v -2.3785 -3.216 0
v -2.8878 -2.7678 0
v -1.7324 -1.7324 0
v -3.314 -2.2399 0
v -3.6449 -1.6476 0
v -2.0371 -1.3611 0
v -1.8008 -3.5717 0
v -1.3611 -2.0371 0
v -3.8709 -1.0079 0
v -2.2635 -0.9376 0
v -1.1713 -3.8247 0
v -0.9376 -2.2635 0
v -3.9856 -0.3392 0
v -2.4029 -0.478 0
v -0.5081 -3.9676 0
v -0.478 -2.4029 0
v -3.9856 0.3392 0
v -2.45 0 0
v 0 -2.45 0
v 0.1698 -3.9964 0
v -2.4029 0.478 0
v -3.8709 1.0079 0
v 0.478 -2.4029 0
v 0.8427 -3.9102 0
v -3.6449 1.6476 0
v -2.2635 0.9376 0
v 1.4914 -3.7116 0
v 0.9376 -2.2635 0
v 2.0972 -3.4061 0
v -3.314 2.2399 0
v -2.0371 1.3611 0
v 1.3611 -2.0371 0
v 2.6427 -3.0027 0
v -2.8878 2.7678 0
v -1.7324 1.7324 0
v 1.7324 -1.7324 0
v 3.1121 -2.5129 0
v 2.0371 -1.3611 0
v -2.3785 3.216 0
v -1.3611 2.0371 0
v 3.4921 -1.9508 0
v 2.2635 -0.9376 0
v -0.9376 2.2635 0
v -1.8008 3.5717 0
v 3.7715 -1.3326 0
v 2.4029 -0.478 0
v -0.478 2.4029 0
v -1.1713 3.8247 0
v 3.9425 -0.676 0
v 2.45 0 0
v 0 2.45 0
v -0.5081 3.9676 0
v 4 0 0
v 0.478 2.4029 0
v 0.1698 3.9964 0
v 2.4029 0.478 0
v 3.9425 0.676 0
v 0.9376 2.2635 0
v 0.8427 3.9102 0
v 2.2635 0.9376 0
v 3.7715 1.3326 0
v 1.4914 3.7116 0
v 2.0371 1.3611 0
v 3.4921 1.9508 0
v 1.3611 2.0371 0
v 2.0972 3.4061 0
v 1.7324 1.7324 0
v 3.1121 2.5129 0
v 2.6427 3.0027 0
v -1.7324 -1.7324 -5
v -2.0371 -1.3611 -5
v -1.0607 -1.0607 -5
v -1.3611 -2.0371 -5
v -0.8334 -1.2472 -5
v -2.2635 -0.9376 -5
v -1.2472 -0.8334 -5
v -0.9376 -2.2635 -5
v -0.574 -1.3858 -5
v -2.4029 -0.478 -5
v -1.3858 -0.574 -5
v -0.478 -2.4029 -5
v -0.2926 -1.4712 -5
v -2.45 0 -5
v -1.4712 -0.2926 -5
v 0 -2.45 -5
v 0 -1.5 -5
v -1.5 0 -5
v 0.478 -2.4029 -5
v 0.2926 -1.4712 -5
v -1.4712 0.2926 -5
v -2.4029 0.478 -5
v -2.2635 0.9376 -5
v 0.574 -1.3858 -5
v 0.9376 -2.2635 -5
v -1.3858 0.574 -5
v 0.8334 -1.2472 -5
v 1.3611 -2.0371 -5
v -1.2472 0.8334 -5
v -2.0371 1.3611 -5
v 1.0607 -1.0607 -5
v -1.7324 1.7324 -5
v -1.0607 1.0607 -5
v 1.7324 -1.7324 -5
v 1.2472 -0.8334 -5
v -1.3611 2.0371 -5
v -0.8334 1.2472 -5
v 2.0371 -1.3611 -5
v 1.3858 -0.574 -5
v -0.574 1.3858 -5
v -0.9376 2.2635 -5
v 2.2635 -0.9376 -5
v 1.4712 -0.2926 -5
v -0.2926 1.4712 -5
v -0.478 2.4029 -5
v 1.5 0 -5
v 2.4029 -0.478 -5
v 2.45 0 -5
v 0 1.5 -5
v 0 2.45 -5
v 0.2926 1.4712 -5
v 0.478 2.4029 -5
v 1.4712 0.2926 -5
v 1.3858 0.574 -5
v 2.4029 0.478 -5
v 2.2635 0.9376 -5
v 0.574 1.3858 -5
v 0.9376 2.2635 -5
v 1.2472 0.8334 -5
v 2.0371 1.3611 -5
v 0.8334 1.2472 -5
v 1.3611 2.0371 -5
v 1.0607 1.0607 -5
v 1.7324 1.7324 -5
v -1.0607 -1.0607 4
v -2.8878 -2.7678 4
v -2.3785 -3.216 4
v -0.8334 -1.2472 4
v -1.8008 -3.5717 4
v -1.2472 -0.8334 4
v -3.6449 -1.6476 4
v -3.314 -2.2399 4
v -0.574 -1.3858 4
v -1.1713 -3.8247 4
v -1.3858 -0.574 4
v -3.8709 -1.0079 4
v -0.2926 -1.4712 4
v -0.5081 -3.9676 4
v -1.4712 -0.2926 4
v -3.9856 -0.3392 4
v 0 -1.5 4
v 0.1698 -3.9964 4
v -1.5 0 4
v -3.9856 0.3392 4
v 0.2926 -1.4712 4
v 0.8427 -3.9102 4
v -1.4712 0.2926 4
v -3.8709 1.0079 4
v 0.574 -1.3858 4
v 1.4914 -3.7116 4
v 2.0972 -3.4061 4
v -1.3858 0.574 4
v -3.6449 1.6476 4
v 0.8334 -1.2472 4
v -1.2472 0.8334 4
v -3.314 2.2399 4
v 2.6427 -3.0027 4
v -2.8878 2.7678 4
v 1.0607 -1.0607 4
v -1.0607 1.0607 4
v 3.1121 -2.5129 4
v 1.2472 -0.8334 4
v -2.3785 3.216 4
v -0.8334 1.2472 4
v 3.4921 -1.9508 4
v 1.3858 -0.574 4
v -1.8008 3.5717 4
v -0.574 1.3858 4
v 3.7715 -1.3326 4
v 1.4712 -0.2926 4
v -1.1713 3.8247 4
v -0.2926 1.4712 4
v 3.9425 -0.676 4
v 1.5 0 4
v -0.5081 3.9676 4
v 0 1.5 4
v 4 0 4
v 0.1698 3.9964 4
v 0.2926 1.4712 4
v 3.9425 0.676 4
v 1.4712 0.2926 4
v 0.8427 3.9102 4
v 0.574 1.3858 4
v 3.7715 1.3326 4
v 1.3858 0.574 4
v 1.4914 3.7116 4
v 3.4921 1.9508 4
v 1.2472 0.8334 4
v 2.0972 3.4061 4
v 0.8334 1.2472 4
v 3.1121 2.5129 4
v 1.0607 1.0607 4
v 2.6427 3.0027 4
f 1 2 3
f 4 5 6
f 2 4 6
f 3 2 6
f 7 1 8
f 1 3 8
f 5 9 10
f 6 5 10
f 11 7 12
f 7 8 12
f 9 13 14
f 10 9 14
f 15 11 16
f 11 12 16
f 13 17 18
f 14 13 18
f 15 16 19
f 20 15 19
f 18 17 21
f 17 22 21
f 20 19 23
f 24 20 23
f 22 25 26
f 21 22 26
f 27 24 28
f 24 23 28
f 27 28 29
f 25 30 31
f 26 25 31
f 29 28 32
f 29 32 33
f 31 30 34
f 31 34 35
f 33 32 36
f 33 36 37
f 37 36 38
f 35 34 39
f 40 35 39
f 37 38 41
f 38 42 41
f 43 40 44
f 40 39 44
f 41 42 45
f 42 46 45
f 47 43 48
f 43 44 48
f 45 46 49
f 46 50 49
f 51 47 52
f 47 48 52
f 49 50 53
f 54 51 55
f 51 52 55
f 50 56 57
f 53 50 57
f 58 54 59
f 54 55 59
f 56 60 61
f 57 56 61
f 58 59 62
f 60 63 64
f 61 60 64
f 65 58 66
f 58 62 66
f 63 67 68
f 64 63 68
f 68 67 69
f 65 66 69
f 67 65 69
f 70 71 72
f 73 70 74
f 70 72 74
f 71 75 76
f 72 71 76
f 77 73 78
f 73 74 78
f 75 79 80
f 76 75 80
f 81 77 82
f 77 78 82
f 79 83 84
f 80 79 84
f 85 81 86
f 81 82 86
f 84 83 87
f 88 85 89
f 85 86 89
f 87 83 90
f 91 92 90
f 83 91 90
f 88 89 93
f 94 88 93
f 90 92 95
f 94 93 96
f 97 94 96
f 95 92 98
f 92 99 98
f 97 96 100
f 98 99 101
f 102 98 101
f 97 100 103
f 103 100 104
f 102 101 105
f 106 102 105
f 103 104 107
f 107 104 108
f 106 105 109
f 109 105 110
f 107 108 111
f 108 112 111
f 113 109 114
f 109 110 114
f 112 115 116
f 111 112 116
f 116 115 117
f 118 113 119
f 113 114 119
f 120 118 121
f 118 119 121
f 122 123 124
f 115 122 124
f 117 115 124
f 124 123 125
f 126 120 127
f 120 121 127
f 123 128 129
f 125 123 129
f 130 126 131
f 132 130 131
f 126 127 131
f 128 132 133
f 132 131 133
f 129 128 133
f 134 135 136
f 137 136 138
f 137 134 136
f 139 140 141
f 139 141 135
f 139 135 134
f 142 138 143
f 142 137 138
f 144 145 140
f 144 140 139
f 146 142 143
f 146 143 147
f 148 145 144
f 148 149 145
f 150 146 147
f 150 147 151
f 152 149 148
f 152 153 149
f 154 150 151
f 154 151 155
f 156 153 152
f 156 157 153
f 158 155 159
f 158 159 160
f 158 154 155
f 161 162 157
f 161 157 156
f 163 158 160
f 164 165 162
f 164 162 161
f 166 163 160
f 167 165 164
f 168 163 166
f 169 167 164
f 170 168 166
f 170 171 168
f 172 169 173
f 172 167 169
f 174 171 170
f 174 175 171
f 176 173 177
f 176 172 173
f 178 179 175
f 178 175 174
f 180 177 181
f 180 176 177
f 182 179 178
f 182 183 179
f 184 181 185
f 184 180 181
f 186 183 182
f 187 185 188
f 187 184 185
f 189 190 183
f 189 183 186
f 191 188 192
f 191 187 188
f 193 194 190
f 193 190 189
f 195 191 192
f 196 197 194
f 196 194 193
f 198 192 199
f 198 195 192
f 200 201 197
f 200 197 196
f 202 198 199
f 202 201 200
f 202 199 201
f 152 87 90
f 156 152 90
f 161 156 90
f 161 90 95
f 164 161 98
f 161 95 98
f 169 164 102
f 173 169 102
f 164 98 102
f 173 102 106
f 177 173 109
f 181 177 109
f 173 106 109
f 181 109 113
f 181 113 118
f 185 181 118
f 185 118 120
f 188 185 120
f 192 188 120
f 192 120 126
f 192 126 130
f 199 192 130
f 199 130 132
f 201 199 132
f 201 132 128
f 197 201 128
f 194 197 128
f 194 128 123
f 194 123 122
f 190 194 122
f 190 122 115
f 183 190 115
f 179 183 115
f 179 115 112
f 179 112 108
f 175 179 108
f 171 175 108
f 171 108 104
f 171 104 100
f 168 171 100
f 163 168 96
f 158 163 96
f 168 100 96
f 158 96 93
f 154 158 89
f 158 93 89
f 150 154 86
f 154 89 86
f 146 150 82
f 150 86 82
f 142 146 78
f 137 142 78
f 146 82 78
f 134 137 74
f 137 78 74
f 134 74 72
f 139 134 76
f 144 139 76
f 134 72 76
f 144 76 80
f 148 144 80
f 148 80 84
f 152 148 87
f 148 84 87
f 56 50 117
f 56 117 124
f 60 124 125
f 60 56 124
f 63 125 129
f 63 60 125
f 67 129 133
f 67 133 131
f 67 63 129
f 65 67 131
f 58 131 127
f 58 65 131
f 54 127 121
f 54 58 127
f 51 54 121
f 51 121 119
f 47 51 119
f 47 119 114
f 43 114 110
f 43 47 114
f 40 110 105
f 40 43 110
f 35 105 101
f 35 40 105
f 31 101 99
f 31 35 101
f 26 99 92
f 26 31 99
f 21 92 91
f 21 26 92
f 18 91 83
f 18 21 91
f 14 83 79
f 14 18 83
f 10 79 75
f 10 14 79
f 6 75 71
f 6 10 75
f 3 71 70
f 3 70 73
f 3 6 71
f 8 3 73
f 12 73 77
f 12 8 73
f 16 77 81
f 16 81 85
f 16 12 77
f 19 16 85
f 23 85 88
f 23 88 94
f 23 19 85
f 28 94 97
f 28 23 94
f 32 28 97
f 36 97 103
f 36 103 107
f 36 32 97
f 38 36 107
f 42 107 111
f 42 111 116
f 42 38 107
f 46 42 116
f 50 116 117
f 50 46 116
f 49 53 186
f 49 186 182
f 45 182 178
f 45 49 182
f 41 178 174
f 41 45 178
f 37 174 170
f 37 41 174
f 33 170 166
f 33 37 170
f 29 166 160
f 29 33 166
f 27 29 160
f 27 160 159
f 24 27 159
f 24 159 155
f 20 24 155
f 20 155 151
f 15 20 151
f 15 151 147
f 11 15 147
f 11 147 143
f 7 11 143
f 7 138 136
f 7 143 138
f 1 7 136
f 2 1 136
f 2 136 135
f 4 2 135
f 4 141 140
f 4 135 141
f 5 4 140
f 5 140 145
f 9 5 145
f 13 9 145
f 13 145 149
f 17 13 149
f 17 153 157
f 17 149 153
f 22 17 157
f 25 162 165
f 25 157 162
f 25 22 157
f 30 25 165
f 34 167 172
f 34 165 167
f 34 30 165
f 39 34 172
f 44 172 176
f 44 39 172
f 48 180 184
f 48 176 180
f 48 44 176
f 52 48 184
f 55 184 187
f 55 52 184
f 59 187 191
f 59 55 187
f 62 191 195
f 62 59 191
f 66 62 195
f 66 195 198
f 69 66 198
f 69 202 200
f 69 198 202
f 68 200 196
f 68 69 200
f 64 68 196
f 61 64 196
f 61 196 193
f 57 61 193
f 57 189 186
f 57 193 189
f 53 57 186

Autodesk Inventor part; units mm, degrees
ref_plane "YZ Plane" through (0, 0, 0) normal (1, 0, 0) x (0, 1, 0)
ref_plane "XZ Plane" through (0, 0, 0) normal (0, 1, 0) x (-1, 0, 0)
ref_plane "XY Plane" through (0, 0, 0) normal (0, 0, 1) x (1, 0, 0)
sketch "스케치1" plane through (0, 0, 0) normal (0, 0, 1) x (1, 0, 0)
  circle A0 centre (0, 0) radius 4
  circle A1 centre (0, 0) radius 2.45
  dimension "d0" = 8
  dimension "d1" = 4.9
extrude "돌출1" add sketch "스케치1" along normal blind 4 contours A0 | A1
extrude "돌출2" add sketch "스케치1" against normal blind 5 contours A1
sketch "스케치2" plane through (0, 0, -5) normal (0, 0, -1) x (-1, 0, 0)
  circle A0 centre (0, 0) radius 1.5
  dimension "d6" = 3
extrude "돌출3" cut sketch "스케치2" against normal through all
properties part number "SteeringConnector"
